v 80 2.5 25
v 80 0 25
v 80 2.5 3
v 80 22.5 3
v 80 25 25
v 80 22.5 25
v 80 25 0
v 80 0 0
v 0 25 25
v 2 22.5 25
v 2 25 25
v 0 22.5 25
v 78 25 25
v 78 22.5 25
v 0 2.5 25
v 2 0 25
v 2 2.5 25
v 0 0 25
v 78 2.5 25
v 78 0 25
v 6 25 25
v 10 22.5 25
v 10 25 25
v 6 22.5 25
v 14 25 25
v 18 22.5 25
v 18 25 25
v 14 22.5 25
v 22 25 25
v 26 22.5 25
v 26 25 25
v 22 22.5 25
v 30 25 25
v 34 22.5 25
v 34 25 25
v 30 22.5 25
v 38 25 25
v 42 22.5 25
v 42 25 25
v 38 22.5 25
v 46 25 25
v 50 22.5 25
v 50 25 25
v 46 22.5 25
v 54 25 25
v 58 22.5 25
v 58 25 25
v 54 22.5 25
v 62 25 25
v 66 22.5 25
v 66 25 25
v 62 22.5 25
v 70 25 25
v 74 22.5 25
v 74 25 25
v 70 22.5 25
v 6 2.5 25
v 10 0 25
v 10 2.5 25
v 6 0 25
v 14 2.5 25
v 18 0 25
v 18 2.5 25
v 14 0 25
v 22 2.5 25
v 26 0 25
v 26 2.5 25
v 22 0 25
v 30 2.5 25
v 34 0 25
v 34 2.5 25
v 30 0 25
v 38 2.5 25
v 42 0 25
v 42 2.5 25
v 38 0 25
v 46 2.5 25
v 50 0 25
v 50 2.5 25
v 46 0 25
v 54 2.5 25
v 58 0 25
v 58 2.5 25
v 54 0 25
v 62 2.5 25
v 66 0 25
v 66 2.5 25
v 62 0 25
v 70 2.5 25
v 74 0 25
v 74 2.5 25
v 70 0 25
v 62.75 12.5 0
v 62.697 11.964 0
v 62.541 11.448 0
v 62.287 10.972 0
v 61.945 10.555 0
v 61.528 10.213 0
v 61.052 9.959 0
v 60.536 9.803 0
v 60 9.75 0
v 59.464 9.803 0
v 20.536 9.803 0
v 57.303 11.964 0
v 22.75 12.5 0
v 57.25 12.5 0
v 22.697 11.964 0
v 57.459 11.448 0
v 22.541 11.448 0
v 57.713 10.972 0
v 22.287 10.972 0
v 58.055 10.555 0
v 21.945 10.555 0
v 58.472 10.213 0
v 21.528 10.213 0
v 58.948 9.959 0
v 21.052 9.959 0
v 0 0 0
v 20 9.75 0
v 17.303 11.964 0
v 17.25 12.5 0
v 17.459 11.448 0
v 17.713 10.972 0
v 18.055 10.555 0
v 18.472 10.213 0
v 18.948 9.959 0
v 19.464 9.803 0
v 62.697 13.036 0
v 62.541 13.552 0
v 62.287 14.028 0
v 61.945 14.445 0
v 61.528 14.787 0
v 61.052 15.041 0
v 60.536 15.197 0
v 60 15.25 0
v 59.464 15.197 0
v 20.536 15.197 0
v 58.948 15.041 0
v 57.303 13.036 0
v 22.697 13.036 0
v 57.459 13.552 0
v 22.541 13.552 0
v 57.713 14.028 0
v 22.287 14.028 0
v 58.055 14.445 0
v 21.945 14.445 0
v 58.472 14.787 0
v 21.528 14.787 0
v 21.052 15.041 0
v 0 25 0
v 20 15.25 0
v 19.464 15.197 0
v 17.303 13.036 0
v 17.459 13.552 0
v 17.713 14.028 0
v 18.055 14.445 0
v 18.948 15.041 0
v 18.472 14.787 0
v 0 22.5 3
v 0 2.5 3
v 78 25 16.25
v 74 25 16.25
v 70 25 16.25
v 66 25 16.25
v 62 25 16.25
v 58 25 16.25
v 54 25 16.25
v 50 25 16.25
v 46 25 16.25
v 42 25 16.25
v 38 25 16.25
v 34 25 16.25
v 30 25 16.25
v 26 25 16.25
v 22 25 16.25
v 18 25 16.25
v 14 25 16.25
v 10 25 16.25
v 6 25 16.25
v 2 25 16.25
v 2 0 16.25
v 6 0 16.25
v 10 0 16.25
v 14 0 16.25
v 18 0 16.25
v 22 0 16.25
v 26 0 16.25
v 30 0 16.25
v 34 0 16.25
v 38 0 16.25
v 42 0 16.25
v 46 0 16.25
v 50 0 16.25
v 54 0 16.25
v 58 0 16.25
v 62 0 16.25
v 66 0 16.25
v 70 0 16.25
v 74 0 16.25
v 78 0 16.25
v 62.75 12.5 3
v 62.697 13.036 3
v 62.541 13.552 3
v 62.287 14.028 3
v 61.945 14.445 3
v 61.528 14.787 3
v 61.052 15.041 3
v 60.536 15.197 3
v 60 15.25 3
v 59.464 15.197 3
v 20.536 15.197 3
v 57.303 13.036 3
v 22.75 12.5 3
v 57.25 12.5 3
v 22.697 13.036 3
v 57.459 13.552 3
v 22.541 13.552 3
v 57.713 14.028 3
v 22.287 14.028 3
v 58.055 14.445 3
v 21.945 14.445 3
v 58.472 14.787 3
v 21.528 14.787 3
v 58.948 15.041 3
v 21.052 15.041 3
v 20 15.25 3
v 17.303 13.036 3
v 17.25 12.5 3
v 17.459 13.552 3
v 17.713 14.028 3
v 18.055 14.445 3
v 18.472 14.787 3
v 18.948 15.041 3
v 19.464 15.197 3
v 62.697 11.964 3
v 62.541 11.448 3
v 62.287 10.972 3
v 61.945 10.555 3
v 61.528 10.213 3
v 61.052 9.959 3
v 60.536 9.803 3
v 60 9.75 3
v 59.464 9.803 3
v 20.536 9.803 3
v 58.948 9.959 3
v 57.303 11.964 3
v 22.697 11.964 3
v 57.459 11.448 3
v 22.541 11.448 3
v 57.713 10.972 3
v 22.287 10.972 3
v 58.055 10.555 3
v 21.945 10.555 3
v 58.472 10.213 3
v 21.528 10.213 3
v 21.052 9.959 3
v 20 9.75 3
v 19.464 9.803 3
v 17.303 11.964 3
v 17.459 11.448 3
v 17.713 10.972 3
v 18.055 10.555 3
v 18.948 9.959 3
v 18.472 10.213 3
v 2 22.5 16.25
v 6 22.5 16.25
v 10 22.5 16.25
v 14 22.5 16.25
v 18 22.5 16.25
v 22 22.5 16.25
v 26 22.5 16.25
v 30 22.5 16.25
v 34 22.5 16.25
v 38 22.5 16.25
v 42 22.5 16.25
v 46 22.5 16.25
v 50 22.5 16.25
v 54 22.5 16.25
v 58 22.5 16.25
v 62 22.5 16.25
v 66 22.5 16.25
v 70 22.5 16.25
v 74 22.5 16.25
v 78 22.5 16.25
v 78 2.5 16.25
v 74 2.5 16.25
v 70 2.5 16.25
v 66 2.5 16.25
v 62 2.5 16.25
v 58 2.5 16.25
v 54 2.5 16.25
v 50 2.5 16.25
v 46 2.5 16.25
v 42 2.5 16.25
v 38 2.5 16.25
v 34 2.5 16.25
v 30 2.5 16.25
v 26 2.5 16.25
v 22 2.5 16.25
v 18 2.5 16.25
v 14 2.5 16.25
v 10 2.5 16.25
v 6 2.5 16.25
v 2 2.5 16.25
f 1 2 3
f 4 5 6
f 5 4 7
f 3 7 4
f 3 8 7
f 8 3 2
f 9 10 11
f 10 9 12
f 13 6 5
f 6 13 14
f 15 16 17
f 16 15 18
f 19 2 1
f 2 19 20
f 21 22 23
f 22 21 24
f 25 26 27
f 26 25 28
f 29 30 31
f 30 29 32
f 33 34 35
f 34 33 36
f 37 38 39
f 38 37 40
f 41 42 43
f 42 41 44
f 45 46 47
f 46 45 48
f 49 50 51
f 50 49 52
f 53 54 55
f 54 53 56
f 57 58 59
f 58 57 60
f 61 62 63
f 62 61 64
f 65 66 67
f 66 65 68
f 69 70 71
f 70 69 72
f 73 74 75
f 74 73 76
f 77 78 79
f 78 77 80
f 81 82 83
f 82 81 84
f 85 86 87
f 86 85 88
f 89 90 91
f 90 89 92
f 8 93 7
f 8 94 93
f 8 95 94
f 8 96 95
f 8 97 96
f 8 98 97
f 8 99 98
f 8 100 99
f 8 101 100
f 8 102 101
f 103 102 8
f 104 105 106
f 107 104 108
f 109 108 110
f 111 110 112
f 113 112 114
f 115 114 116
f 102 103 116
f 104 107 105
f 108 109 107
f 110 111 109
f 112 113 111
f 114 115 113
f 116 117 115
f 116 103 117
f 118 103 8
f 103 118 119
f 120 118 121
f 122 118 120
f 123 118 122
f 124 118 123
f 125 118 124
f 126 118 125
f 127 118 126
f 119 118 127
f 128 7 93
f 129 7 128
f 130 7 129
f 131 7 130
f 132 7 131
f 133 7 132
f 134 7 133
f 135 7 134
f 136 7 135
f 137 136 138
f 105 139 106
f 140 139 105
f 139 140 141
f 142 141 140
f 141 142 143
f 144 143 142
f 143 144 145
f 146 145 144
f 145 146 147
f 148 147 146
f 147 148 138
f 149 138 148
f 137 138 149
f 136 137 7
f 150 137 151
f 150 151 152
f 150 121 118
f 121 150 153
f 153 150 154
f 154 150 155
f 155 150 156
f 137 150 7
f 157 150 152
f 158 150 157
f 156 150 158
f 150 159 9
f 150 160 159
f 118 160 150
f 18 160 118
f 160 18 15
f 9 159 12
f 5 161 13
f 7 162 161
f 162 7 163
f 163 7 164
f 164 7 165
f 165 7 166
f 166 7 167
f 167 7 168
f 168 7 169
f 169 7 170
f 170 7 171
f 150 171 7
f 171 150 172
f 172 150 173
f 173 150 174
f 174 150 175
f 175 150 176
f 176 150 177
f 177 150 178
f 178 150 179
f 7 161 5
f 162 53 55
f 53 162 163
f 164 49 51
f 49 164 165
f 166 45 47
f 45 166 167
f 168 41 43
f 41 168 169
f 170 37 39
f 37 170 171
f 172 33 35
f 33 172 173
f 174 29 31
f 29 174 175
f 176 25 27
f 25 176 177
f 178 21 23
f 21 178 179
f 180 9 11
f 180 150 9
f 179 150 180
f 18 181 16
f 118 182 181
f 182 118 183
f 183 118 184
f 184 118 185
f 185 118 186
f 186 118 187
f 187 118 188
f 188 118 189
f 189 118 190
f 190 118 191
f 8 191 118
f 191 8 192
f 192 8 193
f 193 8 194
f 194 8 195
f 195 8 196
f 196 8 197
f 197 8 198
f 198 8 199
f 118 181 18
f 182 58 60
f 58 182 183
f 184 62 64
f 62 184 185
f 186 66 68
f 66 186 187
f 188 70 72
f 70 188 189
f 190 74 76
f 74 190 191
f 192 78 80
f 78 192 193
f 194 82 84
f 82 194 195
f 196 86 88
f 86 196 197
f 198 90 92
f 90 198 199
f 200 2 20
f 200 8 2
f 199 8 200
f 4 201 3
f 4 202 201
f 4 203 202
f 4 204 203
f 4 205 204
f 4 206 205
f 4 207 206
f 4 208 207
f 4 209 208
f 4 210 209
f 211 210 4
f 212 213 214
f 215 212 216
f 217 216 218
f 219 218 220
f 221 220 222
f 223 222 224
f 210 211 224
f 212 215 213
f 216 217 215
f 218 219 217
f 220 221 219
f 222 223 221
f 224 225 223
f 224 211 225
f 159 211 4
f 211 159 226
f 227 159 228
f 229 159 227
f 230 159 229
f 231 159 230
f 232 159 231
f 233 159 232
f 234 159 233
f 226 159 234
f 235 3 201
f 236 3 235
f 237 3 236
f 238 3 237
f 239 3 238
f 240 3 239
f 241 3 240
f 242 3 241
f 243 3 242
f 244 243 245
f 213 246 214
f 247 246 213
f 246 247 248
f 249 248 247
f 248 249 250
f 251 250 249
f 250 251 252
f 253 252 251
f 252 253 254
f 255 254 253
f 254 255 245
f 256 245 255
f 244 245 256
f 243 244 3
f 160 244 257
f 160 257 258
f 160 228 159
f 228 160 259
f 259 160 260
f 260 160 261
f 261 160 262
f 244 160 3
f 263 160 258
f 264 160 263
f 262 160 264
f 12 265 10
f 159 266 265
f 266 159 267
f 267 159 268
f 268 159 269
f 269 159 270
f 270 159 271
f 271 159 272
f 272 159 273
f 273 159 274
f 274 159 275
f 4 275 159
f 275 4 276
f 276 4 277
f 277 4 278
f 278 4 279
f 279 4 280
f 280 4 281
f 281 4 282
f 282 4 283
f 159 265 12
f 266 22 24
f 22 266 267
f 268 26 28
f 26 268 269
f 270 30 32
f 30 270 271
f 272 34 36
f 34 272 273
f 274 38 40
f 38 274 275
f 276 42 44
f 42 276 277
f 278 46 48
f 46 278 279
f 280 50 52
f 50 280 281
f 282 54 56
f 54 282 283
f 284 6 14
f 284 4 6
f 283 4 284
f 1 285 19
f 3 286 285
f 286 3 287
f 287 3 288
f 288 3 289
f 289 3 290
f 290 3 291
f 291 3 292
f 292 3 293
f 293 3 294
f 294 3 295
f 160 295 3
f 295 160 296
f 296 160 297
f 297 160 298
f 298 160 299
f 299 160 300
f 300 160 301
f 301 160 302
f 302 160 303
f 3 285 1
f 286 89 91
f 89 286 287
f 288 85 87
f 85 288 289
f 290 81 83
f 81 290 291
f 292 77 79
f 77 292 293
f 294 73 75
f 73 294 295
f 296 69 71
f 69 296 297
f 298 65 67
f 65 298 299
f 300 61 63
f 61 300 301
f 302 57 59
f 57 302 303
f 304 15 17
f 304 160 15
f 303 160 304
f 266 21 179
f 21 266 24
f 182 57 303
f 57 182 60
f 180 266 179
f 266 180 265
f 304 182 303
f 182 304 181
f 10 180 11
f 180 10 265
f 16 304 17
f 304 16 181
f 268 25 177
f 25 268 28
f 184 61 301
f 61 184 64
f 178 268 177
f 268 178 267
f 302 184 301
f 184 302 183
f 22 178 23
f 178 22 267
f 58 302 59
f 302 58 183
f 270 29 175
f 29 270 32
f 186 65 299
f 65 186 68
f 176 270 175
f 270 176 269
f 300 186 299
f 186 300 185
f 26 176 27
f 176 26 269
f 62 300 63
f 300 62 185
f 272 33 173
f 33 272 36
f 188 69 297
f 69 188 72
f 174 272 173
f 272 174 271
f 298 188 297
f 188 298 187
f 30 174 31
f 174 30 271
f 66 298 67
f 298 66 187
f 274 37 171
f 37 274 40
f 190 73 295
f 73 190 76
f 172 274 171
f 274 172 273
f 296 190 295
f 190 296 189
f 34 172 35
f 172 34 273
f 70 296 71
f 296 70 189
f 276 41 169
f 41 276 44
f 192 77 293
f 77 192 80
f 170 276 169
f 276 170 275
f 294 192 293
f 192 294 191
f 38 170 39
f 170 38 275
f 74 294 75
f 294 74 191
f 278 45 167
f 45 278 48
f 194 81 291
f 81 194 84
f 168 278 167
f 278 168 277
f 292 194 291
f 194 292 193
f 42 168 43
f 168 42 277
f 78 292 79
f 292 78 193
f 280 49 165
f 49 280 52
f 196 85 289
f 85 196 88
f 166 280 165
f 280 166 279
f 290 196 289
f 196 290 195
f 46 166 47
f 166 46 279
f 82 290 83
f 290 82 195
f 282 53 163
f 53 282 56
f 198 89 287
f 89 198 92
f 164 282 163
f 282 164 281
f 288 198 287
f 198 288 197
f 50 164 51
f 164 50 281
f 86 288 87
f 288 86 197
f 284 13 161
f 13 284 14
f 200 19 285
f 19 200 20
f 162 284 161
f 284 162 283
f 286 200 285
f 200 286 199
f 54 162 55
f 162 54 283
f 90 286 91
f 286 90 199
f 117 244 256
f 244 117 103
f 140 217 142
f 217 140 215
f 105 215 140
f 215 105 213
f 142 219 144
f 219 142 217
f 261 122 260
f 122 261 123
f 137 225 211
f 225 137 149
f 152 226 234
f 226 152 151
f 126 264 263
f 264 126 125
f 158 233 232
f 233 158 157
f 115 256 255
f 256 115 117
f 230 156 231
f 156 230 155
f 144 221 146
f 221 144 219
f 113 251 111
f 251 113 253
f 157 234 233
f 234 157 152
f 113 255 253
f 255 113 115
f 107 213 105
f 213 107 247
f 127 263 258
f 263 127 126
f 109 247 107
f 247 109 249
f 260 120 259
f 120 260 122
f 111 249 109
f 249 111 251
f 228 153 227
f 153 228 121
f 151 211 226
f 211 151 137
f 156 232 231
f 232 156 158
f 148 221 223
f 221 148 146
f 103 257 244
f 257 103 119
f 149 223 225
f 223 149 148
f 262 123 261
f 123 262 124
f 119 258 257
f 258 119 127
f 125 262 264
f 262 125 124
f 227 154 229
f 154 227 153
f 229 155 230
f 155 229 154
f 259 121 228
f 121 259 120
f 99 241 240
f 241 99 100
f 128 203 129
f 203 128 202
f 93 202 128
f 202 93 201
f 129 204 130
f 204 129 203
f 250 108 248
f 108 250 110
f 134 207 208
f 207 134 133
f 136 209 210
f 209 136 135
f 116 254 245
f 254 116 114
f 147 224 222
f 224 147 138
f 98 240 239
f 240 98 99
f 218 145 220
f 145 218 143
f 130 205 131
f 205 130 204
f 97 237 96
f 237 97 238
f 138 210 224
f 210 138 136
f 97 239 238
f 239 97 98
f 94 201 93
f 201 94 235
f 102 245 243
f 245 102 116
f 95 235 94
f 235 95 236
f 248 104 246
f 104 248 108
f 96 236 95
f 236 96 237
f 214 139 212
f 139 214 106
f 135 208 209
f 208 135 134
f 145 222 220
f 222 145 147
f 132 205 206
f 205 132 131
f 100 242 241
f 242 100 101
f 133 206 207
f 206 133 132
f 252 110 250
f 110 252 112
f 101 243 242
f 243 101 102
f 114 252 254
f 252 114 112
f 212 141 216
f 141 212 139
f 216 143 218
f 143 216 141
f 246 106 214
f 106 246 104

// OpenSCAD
$fn = 32;

// ----------------------------------------------------------------------
// Cable duct: 80 x 25 x 25 mm, 10 fingers
// ----------------------------------------------------------------------

// --- parameters (mm) ---
duct_len = 80;            // duct length, X
duct_w = 25;              // duct width, Y
duct_h = 25;              // duct height, Z
wall_t = 2.5;             // side wall thickness
floor_t = 3;              // floor thickness
slot_w = 4;               // finger slot width
slot_h = 13.25;           // finger slot height
fingers = 10;             // number of finger slots per side
pitch = 8;                // finger pitch
hole_d = 5.5;             // floor mounting hole
hole_n = 2;               // mounting holes in the floor

module shell() {
  difference() {
    cube([duct_len, duct_w, duct_h]);
    /* open top channel */
    translate([-wall_t - 1, wall_t, floor_t])
      cube([duct_len + 2 * wall_t + 2, duct_w - 2 * wall_t, duct_h + 1]);
  }
}

difference() {
  union() {
    shell();
  }
  /* finger slots cut through both side walls */
  for (i = [0 : fingers - 1]) translate([pitch / 2 + i * pitch - slot_w / 2, -1, floor_t + slot_h]) cube([slot_w, duct_w + 2, duct_h]);
  for (i = [0 : hole_n - 1]) translate([(duct_len / hole_n) * (i + 0.5), duct_w / 2, -1]) cylinder(h = floor_t + 2, d = hole_d);
}
